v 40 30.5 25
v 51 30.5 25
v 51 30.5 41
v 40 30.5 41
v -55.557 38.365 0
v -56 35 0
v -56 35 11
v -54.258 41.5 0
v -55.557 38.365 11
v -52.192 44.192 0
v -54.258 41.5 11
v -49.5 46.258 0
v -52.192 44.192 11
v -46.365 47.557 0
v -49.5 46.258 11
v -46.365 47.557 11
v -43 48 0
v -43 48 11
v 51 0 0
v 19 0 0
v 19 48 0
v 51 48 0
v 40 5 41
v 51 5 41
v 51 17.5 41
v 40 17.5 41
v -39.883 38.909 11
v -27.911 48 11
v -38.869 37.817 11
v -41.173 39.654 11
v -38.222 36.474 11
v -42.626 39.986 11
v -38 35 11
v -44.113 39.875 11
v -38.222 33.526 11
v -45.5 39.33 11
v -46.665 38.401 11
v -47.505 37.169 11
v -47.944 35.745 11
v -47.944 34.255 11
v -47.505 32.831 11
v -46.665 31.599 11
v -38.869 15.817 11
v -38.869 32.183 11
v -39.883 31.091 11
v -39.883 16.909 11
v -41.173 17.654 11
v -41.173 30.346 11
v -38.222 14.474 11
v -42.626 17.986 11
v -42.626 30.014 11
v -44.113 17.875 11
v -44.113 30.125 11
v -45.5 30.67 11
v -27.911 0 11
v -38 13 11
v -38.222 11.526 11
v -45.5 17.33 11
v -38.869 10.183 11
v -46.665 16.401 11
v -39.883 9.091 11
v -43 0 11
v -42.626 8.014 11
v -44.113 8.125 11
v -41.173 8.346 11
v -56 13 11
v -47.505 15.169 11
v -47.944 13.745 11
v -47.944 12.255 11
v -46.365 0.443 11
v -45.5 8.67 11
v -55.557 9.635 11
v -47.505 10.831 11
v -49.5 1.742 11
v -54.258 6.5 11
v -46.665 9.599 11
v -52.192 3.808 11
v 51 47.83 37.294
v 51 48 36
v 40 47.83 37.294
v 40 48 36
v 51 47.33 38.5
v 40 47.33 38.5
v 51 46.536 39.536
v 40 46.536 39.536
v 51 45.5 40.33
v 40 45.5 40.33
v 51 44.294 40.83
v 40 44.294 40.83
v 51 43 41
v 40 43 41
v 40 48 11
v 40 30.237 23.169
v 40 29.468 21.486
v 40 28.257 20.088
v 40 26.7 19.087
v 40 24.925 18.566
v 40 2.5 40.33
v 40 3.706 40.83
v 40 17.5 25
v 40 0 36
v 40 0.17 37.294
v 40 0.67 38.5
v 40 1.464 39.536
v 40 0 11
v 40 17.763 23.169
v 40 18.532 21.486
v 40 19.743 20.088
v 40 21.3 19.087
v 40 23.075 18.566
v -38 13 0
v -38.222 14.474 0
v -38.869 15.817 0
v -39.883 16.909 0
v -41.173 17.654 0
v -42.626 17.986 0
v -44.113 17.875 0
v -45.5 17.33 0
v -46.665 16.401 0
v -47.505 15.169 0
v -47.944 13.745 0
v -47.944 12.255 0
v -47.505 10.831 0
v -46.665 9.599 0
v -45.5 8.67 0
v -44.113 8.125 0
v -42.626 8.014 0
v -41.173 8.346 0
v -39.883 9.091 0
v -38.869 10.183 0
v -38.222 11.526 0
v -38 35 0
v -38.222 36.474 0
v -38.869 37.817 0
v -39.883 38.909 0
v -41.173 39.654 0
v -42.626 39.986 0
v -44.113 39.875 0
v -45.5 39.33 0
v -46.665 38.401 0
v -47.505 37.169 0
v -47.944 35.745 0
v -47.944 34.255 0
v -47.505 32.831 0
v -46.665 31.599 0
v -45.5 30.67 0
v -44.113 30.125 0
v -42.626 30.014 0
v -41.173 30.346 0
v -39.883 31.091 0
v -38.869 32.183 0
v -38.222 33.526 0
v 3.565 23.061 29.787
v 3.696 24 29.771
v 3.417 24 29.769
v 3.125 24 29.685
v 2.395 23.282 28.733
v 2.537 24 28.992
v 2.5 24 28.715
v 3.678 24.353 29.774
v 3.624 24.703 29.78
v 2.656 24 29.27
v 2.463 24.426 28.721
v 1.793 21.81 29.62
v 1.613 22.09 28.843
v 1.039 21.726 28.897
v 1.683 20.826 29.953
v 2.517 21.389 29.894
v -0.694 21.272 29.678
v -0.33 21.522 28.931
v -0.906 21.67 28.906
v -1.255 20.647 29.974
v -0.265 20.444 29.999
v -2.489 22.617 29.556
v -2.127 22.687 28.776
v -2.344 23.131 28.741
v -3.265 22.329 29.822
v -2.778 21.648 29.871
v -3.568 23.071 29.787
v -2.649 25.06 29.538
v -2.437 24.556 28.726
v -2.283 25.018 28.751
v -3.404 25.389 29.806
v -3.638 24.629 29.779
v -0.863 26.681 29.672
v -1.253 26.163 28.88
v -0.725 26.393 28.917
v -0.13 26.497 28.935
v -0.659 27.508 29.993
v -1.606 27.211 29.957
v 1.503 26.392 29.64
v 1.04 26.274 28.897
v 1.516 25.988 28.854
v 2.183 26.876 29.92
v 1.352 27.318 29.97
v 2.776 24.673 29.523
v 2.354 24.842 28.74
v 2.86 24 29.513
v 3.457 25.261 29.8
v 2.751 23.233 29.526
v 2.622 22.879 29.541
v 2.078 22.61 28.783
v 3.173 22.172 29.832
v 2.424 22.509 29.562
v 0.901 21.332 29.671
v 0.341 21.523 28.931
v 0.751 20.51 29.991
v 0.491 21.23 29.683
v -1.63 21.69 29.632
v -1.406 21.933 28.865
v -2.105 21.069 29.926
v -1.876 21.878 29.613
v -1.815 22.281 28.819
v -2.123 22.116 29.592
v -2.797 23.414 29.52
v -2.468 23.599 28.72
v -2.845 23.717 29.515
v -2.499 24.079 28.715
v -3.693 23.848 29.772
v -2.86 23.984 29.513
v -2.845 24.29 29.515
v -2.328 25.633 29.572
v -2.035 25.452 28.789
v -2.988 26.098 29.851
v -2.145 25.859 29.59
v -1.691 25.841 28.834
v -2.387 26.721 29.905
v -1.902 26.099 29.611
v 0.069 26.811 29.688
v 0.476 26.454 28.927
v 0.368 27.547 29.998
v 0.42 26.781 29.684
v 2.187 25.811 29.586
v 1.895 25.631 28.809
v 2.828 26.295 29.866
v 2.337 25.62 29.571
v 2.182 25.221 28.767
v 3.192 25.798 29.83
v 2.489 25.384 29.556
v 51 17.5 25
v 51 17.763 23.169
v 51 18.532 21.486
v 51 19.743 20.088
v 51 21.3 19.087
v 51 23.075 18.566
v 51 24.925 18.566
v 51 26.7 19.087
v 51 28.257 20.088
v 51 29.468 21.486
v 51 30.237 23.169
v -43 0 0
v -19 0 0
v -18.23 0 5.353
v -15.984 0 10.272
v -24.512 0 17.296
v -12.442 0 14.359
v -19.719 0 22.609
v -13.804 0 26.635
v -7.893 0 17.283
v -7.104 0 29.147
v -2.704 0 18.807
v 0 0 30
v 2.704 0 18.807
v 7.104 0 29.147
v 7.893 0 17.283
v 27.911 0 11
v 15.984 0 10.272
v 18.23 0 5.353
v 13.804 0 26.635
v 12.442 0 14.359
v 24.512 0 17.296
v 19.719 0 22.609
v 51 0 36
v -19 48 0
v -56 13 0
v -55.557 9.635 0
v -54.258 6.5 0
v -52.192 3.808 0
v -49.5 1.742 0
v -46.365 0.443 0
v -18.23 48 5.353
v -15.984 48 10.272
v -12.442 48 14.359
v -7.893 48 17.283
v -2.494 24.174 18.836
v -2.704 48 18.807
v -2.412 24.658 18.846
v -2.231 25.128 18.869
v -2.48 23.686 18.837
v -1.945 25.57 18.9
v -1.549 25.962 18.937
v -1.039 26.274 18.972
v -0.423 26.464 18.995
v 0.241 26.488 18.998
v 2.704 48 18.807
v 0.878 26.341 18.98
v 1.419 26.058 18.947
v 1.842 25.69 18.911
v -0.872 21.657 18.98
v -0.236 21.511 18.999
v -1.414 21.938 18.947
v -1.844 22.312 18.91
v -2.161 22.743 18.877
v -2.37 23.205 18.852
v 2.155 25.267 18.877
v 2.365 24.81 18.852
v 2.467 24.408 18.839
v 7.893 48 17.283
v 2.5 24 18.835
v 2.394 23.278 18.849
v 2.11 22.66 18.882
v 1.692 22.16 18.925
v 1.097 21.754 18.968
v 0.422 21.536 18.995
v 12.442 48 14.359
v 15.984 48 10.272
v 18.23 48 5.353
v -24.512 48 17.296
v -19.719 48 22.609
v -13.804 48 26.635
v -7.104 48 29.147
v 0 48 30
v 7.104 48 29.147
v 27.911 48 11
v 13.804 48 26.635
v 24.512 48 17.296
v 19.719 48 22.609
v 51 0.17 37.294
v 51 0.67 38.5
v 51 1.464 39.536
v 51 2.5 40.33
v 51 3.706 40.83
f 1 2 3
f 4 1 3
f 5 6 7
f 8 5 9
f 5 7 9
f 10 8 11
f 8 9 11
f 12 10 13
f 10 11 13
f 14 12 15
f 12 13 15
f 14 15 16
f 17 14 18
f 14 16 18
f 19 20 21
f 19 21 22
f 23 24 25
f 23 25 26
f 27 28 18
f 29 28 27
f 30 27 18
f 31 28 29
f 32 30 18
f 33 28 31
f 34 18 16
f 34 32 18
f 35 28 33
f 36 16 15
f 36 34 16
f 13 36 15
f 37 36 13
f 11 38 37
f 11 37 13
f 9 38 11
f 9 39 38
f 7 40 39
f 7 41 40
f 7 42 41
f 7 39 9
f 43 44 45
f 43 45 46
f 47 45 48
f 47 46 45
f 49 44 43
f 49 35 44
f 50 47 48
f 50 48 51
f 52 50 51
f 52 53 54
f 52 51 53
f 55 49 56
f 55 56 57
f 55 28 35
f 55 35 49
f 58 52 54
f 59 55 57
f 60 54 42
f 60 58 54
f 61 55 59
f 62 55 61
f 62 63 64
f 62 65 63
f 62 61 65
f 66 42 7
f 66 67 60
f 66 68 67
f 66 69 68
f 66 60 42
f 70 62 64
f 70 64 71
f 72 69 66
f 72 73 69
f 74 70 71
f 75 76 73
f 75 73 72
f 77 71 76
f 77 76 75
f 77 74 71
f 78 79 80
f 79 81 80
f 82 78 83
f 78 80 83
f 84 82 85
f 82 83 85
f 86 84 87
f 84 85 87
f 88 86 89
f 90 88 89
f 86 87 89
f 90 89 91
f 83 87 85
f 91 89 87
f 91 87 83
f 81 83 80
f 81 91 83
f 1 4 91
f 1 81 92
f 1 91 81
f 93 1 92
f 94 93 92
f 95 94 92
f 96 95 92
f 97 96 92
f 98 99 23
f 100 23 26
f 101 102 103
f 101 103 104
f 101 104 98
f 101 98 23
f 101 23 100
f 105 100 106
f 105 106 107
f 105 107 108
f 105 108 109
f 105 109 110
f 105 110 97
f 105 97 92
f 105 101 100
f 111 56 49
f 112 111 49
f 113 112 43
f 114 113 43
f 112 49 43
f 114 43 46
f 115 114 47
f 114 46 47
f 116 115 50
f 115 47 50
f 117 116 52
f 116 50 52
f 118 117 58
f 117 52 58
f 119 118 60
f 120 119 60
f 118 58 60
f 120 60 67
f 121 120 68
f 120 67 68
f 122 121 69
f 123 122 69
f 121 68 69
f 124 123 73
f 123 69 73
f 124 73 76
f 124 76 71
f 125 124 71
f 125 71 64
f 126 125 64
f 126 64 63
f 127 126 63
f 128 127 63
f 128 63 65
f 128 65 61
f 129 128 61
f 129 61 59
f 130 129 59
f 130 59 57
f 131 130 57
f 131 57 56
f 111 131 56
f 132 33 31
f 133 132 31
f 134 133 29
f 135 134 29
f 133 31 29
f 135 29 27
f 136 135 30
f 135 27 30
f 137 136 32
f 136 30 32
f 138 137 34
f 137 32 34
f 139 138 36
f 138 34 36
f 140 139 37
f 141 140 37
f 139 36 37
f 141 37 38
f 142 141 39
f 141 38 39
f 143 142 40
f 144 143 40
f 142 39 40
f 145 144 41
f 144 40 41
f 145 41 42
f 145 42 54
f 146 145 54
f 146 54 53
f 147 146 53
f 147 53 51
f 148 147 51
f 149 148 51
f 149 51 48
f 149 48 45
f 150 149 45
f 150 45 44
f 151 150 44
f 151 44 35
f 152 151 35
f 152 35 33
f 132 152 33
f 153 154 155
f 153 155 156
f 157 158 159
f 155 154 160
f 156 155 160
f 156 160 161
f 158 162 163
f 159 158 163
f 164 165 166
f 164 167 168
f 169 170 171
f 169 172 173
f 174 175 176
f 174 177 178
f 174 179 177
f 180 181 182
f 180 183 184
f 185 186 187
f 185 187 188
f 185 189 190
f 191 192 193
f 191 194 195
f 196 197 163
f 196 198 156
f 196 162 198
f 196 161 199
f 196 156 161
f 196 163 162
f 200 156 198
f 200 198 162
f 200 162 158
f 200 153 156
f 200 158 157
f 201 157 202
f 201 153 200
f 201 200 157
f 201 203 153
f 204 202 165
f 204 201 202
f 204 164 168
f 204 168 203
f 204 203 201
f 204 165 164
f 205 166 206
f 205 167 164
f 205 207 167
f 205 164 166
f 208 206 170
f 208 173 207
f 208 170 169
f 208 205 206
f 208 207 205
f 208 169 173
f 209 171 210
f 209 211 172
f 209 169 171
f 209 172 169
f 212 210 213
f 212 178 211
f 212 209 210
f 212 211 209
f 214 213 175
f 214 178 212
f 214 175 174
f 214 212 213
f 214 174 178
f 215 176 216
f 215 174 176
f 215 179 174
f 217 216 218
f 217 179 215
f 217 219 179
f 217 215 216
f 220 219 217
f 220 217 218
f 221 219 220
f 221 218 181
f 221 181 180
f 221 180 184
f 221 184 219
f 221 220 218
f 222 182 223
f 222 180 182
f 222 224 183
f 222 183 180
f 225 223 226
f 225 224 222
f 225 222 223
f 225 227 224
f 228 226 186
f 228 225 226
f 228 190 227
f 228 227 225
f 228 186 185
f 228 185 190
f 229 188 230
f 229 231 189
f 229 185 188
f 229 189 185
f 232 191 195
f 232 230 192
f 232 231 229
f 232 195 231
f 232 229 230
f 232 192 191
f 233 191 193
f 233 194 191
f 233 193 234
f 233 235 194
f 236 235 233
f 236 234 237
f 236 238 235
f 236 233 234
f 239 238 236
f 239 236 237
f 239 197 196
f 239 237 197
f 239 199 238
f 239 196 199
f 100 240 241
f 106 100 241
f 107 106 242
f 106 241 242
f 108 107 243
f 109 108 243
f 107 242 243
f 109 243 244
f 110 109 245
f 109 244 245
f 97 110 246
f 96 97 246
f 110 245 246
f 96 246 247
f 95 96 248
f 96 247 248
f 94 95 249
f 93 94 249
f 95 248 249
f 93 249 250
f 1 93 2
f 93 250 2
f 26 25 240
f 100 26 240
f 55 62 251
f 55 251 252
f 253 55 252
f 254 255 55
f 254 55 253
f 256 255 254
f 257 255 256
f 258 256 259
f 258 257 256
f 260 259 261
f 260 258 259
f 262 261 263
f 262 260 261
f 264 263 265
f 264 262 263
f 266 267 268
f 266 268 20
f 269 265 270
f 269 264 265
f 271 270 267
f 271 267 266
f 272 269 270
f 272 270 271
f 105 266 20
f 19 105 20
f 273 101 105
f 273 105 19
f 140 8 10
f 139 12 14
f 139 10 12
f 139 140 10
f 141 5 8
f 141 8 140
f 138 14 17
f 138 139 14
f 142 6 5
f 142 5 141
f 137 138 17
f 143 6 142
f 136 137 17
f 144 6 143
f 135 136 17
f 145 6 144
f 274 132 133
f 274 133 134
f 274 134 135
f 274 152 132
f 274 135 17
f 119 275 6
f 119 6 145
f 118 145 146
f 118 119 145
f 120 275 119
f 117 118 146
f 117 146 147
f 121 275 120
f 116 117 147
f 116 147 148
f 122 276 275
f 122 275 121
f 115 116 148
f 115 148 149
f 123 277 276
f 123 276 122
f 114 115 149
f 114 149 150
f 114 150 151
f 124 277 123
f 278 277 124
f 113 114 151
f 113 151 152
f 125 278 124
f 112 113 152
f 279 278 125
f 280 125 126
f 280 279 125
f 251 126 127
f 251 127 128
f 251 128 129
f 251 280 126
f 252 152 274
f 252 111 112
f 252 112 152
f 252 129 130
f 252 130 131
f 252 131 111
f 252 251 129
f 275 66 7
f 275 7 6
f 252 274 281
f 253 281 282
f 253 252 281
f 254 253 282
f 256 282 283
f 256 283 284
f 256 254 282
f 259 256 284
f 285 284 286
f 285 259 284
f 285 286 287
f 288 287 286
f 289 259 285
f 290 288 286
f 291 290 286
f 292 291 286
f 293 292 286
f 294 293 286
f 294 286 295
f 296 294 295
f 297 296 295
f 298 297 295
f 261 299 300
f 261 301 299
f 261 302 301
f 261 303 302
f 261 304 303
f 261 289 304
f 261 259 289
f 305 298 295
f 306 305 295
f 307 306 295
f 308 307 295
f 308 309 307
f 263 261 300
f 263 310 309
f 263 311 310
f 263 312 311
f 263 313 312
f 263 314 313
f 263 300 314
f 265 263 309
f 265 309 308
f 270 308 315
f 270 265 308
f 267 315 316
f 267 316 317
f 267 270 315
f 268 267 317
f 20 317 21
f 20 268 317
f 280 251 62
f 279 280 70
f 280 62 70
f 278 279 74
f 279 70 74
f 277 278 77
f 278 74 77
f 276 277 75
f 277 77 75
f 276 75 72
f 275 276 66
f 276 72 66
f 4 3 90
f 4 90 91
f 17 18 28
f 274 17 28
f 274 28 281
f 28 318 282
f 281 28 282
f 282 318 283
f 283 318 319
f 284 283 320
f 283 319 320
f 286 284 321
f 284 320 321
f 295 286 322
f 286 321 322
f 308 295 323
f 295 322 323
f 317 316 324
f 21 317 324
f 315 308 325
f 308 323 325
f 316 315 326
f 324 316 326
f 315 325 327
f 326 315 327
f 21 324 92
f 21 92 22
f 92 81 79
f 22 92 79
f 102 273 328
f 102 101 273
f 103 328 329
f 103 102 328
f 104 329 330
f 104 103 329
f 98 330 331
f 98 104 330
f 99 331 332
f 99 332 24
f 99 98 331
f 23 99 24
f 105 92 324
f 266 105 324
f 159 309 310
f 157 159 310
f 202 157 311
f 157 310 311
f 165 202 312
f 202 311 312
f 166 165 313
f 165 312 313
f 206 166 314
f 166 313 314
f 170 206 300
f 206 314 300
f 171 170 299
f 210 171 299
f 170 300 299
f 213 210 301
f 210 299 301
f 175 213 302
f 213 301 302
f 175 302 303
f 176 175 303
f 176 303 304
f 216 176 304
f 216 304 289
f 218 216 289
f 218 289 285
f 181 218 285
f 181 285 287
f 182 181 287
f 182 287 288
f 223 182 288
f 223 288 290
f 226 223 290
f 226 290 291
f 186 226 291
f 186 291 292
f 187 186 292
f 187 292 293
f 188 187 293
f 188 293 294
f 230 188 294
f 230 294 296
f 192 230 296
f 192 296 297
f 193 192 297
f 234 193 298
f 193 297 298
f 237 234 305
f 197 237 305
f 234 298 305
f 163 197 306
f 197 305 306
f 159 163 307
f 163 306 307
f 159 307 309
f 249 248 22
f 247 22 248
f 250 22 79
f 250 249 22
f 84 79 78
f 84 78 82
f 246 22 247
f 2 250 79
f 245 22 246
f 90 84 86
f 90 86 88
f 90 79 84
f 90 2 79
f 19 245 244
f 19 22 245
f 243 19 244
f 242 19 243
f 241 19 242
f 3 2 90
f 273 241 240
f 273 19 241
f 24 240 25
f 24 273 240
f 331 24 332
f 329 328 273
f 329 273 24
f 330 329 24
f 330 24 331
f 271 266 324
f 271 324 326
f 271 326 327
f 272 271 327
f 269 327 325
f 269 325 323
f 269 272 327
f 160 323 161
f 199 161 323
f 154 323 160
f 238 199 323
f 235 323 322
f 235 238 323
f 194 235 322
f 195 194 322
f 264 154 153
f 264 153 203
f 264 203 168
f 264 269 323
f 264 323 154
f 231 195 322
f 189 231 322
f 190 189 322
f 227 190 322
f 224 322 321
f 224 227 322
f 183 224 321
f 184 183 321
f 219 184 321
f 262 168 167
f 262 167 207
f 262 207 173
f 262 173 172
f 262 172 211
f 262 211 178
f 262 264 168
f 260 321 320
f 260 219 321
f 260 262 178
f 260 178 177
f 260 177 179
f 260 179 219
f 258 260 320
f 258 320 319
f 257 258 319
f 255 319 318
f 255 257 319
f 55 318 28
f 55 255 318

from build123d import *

# Parameters (mm, degrees)
F1_DEPTH = 48
F2_R     = 5
F3_DEPTH = 11.001
F5_DEPTH = 15.748
F6_R     = 2.5
F7_DEPTH = 41.001
F8_R     = 1.064771
F9_R     = 5


with BuildPart() as f1:
    # F0 (on Front) → F1 (new body)
    with BuildSketch(Plane.XZ):
        with BuildLine():
            Line((-27.910571, 11), (-56, 11))
            Line((-56, 11), (-56, 0))
            Line((-56, 0), (-19, 0))
            ThreePointArc((-19, 0), (0, 19), (19, 0))
            Line((19, 0), (51, 0))
            Line((51, 0), (51, 41))
            Line((51, 41), (40, 41))
            Line((40, 41), (40, 11))
            Line((40, 11), (27.910571, 11))
            ThreePointArc((27.910571, 11), (0, 30), (-27.910571, 11))
        make_face()
    extrude(amount=-F1_DEPTH)

    # F2 (on face) → F3 (cut, through all)
    with BuildSketch(Plane.XY.offset(11)):
        with Locations((-43, 35)):
            Circle(F2_R)
        with Locations((-43, 13)):
            Circle(F2_R)
        with BuildLine():
            Line((-56, 48), (-56, 35))
            ThreePointArc((-56, 35), (-52.192388, 44.192388), (-43, 48))
            Line((-43, 48), (-56, 48))
        make_face()
        with BuildLine():
            Line((-56, 0), (-43, 0))
            ThreePointArc((-43, 0), (-52.192388, 3.807612), (-56, 13))
            Line((-56, 13), (-56, 0))
        make_face()
    extrude(amount=-F3_DEPTH, mode=Mode.SUBTRACT)

    # F4 (on face) → F5 (cut)
    with BuildSketch(Plane.YZ.offset(51)):
        with BuildLine():
            Line((30.5, 41), (17.5, 41))
            Line((17.5, 41), (17.5, 25))
            ThreePointArc((17.5, 25), (24, 18.5), (30.5, 25))
            Line((30.5, 25), (30.5, 41))
        make_face()
    extrude(amount=-F5_DEPTH, mode=Mode.SUBTRACT)

    # F6 (on face) → F7 (cut, through all)
    with BuildSketch(Plane(origin=(0, 0, 0), x_dir=(1, 0, 0), z_dir=(0, 0, -1))):
        with Locations((0, -24)):
            Circle(F6_R)
    extrude(amount=-F7_DEPTH, mode=Mode.SUBTRACT)

    # F8
    f8_edges = [f1.edges().sort_by_distance(p)[0] for p in [
        (-2.5, 24, 29.895652),
    ]]
    fillet(f8_edges, radius=F8_R)

    # F9
    f9_edges = [f1.edges().sort_by_distance(p)[0] for p in [
        (45.5, 0, 41),
        (45.5, 48, 41),
    ]]
    fillet(f9_edges, radius=F9_R)


solid = f1.part
